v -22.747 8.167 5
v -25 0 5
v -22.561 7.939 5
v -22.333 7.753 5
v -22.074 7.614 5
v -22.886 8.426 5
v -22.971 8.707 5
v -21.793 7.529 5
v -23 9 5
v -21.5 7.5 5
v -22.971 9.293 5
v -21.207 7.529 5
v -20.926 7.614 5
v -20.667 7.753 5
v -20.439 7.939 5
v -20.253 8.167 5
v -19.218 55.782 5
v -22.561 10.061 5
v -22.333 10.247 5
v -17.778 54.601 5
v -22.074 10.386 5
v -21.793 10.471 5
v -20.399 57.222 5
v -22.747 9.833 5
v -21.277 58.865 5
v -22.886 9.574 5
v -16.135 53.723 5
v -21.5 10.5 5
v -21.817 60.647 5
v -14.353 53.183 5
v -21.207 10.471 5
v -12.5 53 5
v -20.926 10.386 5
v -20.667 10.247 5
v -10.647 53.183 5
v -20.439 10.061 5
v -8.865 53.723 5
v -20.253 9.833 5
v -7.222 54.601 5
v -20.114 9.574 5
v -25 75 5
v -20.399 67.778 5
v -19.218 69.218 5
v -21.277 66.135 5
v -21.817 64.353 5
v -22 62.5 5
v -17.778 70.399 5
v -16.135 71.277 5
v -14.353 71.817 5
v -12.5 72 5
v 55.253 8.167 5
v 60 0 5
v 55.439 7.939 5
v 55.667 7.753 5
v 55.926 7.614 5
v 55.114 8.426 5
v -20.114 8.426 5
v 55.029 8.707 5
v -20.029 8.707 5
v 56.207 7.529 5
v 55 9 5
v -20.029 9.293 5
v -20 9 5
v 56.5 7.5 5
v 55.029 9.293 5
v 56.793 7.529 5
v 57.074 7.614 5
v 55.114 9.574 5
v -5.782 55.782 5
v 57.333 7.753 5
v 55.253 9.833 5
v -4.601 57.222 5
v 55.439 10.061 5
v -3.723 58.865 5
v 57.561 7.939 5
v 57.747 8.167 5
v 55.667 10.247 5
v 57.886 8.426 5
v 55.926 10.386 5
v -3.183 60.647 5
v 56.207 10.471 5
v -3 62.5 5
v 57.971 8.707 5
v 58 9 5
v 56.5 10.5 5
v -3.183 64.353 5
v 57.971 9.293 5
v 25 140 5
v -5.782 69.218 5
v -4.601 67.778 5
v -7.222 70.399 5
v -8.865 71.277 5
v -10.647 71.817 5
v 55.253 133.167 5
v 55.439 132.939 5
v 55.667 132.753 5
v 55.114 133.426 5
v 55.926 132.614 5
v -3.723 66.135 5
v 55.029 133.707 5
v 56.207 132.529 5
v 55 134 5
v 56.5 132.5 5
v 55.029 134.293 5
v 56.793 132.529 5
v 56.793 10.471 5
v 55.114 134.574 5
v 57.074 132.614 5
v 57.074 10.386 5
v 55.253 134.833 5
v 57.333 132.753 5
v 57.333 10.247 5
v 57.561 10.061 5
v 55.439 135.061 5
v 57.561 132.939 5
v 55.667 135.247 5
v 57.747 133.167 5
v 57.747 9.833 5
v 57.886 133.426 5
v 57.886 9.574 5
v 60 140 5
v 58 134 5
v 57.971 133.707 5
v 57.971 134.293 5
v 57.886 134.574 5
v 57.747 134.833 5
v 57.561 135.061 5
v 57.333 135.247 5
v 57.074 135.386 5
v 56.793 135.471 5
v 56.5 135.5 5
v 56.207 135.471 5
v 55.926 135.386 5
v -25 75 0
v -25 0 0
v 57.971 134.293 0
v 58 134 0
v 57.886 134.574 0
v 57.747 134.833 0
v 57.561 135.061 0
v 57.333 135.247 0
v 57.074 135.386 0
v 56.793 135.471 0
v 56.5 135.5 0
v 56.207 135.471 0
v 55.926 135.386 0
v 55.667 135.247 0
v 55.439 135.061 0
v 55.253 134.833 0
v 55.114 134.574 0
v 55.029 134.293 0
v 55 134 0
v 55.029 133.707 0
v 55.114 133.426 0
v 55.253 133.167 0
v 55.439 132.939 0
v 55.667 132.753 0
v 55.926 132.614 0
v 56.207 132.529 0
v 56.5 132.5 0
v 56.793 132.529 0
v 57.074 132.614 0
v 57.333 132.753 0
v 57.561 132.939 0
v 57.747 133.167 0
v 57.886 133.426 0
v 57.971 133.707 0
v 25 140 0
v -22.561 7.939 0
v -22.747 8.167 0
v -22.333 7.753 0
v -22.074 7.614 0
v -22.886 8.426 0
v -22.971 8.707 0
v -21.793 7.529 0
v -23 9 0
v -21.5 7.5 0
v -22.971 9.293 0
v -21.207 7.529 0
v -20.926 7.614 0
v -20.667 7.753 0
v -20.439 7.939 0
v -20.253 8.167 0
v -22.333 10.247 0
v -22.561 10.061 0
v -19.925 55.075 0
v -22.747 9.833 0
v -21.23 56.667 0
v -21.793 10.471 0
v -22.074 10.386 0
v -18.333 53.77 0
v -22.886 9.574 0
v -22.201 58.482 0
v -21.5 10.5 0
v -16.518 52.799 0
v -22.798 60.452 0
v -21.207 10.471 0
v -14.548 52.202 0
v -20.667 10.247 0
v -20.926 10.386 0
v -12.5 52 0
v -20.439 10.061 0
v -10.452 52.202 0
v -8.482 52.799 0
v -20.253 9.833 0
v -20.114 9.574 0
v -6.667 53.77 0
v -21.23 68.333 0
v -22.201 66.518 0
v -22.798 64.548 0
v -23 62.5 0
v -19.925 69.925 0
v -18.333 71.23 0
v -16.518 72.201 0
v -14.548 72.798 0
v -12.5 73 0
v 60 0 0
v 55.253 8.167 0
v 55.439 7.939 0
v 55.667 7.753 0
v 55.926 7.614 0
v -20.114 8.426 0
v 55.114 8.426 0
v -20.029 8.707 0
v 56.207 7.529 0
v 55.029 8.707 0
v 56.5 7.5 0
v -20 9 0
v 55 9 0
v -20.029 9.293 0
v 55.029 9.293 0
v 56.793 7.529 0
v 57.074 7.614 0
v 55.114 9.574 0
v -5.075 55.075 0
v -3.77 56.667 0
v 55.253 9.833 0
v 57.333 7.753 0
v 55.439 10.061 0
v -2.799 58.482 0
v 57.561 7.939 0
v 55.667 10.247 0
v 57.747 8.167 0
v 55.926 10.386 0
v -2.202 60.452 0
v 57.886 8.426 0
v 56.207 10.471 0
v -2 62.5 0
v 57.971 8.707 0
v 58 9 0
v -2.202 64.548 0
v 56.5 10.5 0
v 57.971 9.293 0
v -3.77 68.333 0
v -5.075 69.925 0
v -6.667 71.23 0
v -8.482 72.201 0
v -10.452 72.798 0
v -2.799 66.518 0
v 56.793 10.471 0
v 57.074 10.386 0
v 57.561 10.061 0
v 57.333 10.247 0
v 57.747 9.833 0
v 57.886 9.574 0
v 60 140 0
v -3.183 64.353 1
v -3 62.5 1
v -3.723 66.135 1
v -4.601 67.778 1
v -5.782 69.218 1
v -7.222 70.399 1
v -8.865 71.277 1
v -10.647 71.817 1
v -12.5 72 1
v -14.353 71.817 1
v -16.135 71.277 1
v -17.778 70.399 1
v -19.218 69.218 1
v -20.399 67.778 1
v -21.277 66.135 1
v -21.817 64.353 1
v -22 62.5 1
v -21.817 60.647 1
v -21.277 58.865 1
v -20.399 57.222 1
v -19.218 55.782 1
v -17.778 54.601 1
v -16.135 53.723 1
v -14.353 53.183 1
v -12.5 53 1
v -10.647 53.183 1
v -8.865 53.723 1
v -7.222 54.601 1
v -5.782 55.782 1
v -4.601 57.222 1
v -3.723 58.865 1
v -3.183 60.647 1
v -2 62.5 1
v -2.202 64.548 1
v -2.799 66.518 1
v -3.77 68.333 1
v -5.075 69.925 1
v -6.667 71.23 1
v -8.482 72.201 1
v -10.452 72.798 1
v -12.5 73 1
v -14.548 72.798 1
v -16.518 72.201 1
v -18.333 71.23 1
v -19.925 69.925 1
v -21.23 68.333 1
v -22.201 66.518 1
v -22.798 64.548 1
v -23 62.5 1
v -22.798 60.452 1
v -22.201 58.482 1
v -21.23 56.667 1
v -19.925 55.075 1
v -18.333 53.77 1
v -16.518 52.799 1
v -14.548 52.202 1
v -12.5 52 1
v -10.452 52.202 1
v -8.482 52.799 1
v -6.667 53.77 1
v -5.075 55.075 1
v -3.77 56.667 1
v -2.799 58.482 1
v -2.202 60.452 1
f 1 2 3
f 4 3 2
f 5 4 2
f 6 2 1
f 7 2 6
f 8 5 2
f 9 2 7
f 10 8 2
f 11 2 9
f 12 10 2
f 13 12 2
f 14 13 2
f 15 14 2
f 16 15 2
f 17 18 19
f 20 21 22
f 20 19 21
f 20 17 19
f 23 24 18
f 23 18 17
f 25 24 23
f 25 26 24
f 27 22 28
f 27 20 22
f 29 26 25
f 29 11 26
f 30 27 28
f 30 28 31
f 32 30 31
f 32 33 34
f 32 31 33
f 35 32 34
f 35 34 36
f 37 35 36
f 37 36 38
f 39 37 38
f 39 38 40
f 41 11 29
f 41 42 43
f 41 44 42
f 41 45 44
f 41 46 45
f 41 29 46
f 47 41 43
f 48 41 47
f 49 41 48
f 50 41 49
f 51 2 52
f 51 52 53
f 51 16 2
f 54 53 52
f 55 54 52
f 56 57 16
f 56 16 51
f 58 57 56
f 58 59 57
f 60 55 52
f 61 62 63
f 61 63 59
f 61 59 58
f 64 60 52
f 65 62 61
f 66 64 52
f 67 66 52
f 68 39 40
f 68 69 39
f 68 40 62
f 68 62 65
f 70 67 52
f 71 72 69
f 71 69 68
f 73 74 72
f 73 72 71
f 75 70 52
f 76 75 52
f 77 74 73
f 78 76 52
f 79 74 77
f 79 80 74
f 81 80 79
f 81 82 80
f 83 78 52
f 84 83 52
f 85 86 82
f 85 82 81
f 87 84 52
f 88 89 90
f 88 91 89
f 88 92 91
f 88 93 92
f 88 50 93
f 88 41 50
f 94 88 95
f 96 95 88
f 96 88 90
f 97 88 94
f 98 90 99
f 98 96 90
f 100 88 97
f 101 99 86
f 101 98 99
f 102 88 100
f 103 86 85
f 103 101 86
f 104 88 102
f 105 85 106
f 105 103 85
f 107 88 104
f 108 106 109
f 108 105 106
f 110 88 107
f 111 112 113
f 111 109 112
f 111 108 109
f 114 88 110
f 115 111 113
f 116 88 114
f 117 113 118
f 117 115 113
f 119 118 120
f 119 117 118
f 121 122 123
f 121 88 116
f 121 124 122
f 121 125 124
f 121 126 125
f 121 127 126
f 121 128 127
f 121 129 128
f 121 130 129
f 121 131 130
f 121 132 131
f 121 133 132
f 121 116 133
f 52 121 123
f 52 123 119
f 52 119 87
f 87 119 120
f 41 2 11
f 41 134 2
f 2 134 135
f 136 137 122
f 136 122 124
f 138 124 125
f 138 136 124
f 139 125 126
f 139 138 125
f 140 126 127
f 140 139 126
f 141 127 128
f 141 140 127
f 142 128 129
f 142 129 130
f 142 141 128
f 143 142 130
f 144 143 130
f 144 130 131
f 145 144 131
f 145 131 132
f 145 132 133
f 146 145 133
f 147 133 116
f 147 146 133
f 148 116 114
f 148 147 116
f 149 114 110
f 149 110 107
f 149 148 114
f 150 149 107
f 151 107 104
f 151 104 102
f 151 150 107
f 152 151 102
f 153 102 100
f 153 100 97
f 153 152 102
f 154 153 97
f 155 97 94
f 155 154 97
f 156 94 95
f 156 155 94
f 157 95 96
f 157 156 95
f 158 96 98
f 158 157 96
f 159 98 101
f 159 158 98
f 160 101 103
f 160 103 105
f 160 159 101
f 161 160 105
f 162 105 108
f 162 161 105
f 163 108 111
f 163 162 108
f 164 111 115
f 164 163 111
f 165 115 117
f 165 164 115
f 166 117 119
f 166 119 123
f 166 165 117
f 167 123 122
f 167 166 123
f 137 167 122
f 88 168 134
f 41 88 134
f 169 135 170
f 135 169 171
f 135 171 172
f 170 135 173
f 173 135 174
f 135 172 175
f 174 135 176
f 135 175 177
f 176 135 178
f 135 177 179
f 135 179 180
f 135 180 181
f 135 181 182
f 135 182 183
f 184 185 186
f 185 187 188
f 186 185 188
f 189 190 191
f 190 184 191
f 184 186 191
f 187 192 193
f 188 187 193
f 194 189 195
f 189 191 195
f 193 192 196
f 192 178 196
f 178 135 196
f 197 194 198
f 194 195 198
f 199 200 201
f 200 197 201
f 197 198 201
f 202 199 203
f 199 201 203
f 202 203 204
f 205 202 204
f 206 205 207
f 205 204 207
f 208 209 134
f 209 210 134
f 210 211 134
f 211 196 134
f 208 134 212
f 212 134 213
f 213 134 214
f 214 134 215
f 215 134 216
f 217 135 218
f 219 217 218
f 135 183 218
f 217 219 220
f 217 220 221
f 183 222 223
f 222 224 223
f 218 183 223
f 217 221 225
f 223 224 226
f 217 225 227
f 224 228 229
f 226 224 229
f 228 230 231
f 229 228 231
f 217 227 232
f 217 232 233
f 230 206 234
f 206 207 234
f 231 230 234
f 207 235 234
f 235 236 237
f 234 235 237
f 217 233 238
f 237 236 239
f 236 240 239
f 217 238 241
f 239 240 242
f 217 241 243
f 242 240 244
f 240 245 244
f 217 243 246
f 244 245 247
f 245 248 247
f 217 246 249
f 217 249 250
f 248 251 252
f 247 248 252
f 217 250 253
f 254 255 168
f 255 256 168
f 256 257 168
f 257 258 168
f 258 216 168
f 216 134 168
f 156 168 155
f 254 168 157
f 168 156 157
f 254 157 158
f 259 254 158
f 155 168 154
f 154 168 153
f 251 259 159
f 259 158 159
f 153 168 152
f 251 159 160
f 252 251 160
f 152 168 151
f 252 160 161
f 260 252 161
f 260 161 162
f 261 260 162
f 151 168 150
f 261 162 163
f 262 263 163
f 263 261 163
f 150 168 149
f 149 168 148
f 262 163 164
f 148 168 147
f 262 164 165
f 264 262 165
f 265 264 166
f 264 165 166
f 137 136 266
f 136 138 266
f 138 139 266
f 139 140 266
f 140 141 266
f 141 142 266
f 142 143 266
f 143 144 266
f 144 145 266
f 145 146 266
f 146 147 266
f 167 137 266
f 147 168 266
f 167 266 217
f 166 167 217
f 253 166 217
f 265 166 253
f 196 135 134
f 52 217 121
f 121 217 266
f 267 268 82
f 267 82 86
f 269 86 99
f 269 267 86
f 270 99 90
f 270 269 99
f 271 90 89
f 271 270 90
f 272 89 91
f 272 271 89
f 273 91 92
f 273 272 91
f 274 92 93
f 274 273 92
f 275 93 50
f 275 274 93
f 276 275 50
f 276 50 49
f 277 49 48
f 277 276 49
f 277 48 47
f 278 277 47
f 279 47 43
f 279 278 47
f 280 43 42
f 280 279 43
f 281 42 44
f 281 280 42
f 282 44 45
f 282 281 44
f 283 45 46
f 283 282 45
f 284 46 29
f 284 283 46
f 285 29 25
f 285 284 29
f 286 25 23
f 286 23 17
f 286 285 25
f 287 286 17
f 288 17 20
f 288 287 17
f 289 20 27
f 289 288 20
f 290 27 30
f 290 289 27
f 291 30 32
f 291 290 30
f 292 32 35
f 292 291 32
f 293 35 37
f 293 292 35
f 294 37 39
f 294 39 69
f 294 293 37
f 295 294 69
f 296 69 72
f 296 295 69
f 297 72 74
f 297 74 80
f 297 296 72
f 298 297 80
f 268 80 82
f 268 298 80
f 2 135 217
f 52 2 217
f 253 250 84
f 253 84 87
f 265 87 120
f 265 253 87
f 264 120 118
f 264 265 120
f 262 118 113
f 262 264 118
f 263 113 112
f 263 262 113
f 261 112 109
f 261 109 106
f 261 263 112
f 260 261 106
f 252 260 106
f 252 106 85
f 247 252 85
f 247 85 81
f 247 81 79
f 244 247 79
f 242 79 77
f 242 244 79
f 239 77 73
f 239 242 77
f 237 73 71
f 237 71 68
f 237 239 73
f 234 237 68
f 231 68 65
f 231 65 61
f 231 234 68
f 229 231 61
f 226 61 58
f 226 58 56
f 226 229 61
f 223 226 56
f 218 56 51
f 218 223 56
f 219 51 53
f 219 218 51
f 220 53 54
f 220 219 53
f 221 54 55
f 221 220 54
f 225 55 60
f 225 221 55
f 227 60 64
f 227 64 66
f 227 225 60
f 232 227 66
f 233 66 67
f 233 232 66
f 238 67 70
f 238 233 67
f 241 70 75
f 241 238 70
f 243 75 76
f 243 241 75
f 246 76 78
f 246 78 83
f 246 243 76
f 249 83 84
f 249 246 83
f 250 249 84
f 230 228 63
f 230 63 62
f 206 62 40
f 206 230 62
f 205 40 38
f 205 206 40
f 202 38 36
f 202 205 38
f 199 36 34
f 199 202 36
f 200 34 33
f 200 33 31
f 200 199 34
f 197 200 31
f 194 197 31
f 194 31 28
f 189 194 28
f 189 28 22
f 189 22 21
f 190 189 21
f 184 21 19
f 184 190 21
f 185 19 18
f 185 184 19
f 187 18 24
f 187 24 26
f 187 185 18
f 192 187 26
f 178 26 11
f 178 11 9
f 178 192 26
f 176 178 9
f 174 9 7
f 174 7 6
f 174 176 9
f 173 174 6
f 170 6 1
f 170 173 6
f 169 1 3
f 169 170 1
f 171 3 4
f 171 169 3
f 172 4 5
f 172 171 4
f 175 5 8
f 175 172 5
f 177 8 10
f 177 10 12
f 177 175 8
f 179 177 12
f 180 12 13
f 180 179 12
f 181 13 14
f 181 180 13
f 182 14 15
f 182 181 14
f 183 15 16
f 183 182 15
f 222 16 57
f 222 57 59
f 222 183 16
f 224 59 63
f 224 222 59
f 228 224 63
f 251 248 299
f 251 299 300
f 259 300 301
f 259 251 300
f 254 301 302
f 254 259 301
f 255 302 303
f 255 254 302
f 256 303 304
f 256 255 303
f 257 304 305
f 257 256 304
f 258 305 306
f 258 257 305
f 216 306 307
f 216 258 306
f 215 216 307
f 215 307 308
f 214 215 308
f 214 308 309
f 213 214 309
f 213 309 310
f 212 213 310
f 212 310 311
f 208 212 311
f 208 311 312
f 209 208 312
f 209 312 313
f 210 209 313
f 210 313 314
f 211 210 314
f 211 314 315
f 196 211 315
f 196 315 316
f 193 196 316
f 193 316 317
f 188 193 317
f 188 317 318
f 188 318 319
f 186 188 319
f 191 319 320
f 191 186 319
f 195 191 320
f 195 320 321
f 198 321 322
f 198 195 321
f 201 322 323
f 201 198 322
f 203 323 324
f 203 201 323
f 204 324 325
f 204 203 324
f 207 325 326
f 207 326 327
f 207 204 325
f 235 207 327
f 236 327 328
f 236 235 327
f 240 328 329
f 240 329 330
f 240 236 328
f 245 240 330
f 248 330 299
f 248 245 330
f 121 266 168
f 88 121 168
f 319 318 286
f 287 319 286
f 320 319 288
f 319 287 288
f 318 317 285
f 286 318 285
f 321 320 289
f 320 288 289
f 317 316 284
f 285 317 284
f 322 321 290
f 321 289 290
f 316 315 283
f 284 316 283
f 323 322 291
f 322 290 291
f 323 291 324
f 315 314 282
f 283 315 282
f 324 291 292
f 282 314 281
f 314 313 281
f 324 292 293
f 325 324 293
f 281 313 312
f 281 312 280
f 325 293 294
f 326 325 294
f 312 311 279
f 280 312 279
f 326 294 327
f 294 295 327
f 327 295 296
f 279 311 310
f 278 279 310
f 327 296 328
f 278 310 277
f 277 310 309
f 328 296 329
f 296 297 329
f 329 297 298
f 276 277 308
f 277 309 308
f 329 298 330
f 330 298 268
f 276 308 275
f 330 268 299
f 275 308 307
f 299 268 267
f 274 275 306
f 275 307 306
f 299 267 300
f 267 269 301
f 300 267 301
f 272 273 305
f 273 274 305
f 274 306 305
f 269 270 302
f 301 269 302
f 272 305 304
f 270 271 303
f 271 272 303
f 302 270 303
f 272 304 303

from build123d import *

# Parameters (mm, degrees)
SKETCH1_R           = 1.5
SKETCH1_R_2         = 10.5
BOSS_EXTRUDE1_DEPTH = 5
BOSS_EXTRUDE2_START = 1
SKETCH1_3_R         = 10.5
SKETCH1_3_R_2       = 9.5
BOSS_EXTRUDE2_DEPTH = 4


with BuildPart() as part:
    # Sketch1 → Boss-Extrude1 (new body)
    with BuildSketch(Plane.XY):
        Polygon((-25, 0), (50, 0), (60, 0), (60, 140), (25, 140), (-25, 75), align=None)
        with Locations((-21.5, 9)):
            Circle(SKETCH1_R, mode=Mode.SUBTRACT)
        with Locations((-12.5, 62.5)):
            Circle(SKETCH1_R_2, mode=Mode.SUBTRACT)
        with Locations((56.5, 9)):
            Circle(SKETCH1_R, mode=Mode.SUBTRACT)
        with Locations((56.5, 134)):
            Circle(SKETCH1_R, mode=Mode.SUBTRACT)
    extrude(amount=BOSS_EXTRUDE1_DEPTH)

    # Sketch1<3> → Boss-Extrude2 (add)
    with BuildSketch(Plane.XY.offset(BOSS_EXTRUDE2_START)):
        with Locations((-12.5, 62.5)):
            Circle(SKETCH1_3_R)
        with Locations((-12.5, 62.5)):
            Circle(SKETCH1_3_R_2, mode=Mode.SUBTRACT)
    extrude(amount=BOSS_EXTRUDE2_DEPTH)


solid = part.part
